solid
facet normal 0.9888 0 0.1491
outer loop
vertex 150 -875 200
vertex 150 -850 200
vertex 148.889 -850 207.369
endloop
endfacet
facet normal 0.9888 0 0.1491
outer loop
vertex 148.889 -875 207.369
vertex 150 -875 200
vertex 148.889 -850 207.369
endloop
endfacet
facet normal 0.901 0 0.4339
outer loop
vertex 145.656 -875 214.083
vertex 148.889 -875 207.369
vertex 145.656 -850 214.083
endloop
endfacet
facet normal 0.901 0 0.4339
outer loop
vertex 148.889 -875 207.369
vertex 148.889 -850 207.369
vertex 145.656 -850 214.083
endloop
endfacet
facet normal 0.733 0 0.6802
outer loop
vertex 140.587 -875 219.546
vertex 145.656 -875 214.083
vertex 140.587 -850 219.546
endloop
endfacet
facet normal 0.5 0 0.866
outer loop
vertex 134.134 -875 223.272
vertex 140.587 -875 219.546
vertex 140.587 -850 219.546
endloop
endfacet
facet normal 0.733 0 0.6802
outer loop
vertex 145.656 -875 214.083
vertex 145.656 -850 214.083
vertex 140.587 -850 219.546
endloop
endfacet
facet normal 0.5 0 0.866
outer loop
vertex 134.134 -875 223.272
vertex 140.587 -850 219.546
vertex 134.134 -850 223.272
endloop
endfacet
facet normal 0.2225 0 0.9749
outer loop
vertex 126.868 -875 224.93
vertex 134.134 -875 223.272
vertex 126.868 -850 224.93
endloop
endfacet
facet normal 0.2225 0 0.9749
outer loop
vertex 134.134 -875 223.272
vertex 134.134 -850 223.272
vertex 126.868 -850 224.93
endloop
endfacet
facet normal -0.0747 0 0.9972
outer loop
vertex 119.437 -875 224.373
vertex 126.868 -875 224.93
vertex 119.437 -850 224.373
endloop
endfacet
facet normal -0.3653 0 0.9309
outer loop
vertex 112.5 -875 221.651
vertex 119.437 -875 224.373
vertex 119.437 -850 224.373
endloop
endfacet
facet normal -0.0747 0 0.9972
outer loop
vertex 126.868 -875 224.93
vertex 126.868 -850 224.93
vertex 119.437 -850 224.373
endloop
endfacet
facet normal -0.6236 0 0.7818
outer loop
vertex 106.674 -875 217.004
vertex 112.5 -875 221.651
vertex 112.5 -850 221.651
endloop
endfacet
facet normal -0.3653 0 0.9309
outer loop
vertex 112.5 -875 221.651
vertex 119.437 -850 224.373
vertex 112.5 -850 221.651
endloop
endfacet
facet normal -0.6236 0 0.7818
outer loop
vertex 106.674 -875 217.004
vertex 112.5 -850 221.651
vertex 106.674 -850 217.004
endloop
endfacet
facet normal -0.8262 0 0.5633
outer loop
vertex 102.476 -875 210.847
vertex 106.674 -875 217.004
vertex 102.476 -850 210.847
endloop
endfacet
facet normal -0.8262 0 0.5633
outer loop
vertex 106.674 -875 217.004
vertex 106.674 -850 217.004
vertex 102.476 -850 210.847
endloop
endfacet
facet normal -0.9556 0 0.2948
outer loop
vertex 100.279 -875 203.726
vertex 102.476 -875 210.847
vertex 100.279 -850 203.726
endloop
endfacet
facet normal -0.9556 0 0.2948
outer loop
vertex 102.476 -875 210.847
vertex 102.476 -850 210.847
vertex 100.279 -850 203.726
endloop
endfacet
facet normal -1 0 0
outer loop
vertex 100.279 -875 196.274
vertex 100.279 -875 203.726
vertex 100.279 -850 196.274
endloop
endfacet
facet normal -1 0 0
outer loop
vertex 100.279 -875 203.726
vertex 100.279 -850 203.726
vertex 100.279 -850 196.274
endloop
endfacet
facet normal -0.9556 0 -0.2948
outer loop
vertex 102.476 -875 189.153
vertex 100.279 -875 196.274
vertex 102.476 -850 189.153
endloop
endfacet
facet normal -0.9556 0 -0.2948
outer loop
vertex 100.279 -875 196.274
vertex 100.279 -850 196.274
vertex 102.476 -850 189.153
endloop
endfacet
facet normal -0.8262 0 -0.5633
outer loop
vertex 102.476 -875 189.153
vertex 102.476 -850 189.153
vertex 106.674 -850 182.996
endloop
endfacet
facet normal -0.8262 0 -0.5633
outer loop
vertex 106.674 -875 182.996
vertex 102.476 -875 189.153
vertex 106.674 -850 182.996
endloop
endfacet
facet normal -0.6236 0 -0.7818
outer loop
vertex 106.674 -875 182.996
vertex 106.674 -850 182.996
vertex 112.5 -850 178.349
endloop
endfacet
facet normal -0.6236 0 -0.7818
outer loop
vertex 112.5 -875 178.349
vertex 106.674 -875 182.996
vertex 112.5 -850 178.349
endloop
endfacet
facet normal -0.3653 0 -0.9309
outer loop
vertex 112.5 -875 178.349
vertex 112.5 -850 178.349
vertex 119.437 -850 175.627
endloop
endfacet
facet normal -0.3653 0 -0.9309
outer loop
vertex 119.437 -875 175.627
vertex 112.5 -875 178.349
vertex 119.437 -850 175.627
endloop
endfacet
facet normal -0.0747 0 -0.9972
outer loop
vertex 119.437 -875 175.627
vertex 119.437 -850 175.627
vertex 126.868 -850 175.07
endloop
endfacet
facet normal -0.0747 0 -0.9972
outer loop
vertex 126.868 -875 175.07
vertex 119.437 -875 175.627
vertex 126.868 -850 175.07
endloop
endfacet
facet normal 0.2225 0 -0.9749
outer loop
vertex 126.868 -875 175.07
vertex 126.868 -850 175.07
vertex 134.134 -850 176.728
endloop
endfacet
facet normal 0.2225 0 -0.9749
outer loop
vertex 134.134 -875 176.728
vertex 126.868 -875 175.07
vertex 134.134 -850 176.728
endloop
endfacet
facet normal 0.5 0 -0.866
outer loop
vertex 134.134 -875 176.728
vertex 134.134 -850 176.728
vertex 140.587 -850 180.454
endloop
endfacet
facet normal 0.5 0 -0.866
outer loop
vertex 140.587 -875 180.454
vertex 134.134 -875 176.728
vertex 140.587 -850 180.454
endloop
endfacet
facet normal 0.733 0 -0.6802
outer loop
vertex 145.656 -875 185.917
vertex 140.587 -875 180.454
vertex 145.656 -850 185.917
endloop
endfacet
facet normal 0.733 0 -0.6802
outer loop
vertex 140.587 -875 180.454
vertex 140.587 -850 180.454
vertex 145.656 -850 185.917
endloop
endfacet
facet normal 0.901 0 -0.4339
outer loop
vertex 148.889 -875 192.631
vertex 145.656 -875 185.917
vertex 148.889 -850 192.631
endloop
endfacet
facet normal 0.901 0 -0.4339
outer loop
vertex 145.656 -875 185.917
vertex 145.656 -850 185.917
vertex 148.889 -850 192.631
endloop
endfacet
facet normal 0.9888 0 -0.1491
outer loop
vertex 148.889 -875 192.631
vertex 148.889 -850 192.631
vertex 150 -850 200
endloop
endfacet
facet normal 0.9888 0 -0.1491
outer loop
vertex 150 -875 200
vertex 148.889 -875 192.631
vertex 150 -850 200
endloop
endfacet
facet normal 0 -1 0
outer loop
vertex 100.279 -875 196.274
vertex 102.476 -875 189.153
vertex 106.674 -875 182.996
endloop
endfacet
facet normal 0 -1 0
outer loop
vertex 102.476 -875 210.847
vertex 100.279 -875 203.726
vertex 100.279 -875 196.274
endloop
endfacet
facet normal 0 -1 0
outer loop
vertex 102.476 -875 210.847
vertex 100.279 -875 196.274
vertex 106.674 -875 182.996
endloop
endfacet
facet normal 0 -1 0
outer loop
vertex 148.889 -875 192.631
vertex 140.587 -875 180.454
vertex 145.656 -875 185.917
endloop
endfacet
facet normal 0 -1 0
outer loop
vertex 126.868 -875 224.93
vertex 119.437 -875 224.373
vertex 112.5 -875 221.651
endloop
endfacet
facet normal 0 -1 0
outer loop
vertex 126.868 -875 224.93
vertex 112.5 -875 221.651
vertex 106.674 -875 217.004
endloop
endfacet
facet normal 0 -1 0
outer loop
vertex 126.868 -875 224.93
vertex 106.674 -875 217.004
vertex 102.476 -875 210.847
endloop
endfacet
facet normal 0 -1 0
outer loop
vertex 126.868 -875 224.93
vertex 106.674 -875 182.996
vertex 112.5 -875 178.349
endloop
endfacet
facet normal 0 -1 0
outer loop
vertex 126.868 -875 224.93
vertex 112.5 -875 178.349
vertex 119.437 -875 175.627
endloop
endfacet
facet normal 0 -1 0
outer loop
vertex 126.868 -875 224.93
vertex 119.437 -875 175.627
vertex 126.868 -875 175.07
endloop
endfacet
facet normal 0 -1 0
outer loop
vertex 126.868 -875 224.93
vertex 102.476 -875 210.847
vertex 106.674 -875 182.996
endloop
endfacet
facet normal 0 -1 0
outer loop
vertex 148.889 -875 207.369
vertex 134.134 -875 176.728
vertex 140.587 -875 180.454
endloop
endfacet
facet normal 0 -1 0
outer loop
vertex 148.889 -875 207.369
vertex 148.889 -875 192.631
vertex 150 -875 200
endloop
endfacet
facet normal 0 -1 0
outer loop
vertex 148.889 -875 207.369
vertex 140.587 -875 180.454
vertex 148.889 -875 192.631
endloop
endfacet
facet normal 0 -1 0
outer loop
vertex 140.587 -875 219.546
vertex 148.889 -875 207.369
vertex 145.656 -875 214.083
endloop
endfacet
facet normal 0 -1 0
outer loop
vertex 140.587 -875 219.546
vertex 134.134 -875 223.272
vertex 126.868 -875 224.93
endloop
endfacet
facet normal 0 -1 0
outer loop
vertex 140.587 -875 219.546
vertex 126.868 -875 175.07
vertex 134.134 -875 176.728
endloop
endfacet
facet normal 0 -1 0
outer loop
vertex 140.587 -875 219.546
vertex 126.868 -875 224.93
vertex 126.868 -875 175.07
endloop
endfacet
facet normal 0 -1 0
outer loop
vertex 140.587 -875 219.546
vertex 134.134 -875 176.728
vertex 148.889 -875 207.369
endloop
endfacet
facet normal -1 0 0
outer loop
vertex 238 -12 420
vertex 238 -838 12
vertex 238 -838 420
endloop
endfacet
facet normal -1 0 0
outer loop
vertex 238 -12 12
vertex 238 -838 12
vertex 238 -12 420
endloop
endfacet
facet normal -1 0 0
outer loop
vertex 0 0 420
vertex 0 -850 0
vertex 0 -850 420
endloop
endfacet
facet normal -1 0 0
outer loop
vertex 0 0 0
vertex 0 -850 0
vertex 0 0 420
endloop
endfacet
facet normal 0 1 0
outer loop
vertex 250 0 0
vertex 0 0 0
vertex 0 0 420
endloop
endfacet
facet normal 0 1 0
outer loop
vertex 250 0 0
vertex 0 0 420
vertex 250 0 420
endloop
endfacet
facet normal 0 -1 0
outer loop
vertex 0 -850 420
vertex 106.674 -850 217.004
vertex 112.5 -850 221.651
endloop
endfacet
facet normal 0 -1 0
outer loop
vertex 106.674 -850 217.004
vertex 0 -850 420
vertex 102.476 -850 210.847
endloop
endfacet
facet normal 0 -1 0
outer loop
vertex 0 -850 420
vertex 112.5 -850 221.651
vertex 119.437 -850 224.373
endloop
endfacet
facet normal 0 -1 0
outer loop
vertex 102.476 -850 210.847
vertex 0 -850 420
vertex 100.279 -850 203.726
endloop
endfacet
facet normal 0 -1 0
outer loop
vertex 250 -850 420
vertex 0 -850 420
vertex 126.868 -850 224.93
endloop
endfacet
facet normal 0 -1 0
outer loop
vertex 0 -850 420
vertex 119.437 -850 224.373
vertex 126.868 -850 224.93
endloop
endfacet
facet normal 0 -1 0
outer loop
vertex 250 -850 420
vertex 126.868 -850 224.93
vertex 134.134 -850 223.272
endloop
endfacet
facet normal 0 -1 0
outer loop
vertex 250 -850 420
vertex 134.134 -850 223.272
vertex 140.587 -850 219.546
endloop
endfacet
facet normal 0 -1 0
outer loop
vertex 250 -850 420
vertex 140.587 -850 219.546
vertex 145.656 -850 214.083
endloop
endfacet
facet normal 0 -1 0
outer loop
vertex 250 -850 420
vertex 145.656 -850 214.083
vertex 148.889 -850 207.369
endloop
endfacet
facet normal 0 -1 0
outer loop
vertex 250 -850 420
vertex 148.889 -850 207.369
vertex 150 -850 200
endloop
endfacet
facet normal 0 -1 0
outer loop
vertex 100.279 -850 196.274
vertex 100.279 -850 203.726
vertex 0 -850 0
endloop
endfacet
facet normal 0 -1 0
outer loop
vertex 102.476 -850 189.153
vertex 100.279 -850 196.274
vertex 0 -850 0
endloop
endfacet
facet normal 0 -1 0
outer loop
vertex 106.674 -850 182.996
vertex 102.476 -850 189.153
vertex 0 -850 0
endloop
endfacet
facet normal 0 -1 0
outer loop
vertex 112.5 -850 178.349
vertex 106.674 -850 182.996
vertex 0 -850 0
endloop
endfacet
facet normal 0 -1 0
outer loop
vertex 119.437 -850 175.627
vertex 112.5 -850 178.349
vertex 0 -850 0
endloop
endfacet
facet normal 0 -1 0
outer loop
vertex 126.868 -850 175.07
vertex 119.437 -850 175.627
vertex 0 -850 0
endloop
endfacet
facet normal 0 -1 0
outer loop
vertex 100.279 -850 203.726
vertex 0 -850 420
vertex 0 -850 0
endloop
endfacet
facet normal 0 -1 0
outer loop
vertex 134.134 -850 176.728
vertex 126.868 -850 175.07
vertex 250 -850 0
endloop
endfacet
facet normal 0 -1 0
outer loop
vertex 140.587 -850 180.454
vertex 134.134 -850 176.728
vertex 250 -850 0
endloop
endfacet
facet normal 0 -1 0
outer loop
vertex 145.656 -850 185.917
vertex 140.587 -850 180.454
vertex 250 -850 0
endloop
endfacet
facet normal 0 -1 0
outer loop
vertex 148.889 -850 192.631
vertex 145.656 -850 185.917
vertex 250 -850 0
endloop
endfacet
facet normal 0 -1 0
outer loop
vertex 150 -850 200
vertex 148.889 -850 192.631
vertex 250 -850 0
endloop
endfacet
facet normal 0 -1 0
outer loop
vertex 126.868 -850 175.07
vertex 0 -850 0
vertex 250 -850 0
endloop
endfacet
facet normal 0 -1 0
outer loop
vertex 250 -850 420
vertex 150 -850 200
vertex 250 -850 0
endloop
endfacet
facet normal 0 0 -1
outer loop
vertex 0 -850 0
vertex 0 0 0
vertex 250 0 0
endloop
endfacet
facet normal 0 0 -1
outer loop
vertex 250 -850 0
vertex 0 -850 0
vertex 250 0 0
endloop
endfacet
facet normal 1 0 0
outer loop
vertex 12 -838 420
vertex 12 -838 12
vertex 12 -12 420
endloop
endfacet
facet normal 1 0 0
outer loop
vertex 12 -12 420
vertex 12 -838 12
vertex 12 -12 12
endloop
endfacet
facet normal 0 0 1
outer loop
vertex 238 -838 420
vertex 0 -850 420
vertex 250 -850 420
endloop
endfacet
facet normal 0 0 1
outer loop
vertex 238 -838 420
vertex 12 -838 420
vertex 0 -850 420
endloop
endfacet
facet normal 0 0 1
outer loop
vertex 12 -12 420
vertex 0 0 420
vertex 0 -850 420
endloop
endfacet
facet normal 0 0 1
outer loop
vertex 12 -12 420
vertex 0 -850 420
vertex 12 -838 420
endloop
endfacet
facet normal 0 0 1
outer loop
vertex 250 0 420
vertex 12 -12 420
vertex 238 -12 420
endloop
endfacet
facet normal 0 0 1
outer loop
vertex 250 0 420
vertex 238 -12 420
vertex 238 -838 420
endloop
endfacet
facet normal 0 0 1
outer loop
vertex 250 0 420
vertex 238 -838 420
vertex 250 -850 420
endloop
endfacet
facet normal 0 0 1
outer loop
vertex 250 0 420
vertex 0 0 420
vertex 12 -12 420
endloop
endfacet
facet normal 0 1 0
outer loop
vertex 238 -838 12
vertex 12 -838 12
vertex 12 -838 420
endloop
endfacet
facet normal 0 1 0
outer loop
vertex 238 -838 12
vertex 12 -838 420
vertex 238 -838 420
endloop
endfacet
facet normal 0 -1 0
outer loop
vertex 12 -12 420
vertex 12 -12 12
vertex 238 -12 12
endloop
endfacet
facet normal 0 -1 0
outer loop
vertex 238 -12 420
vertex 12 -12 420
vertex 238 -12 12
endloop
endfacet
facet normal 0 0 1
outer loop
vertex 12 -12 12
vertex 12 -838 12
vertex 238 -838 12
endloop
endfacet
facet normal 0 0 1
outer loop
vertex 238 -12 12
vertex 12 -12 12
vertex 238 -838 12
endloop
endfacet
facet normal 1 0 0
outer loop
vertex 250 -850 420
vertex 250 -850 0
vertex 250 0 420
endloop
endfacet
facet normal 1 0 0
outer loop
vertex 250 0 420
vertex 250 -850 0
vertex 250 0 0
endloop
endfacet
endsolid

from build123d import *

# Parameters (mm, degrees)
F0_W     = 250
F0_H     = 850
F1_DEPTH = 12
F2_W     = 250
F2_H     = 850
F2_W_2   = 226
F2_H_2   = 826
F3_DEPTH = 408
F4_R     = 25
F5_DEPTH = 25


with BuildPart() as f1:
    # F0 (on Top) → F1 (new body)
    with BuildSketch(Plane.XY):
        with Locations((125, -425)):
            Rectangle(F0_W, F0_H)
    extrude(amount=F1_DEPTH)

    # F2 (on face) → F3 (join)
    with BuildSketch(Plane.XY.offset(12)):
        with Locations((125, -425)):
            Rectangle(F2_W, F2_H)
        with Locations((125, -425)):
            Rectangle(F2_W_2, F2_H_2, mode=Mode.SUBTRACT)
    extrude(amount=F3_DEPTH)

    # F4 (on face) → F5 (join)
    with BuildSketch(Plane.XZ.offset(850)):
        with Locations((125, 200)):
            Circle(F4_R)
    extrude(amount=F5_DEPTH)


solid = f1.part
